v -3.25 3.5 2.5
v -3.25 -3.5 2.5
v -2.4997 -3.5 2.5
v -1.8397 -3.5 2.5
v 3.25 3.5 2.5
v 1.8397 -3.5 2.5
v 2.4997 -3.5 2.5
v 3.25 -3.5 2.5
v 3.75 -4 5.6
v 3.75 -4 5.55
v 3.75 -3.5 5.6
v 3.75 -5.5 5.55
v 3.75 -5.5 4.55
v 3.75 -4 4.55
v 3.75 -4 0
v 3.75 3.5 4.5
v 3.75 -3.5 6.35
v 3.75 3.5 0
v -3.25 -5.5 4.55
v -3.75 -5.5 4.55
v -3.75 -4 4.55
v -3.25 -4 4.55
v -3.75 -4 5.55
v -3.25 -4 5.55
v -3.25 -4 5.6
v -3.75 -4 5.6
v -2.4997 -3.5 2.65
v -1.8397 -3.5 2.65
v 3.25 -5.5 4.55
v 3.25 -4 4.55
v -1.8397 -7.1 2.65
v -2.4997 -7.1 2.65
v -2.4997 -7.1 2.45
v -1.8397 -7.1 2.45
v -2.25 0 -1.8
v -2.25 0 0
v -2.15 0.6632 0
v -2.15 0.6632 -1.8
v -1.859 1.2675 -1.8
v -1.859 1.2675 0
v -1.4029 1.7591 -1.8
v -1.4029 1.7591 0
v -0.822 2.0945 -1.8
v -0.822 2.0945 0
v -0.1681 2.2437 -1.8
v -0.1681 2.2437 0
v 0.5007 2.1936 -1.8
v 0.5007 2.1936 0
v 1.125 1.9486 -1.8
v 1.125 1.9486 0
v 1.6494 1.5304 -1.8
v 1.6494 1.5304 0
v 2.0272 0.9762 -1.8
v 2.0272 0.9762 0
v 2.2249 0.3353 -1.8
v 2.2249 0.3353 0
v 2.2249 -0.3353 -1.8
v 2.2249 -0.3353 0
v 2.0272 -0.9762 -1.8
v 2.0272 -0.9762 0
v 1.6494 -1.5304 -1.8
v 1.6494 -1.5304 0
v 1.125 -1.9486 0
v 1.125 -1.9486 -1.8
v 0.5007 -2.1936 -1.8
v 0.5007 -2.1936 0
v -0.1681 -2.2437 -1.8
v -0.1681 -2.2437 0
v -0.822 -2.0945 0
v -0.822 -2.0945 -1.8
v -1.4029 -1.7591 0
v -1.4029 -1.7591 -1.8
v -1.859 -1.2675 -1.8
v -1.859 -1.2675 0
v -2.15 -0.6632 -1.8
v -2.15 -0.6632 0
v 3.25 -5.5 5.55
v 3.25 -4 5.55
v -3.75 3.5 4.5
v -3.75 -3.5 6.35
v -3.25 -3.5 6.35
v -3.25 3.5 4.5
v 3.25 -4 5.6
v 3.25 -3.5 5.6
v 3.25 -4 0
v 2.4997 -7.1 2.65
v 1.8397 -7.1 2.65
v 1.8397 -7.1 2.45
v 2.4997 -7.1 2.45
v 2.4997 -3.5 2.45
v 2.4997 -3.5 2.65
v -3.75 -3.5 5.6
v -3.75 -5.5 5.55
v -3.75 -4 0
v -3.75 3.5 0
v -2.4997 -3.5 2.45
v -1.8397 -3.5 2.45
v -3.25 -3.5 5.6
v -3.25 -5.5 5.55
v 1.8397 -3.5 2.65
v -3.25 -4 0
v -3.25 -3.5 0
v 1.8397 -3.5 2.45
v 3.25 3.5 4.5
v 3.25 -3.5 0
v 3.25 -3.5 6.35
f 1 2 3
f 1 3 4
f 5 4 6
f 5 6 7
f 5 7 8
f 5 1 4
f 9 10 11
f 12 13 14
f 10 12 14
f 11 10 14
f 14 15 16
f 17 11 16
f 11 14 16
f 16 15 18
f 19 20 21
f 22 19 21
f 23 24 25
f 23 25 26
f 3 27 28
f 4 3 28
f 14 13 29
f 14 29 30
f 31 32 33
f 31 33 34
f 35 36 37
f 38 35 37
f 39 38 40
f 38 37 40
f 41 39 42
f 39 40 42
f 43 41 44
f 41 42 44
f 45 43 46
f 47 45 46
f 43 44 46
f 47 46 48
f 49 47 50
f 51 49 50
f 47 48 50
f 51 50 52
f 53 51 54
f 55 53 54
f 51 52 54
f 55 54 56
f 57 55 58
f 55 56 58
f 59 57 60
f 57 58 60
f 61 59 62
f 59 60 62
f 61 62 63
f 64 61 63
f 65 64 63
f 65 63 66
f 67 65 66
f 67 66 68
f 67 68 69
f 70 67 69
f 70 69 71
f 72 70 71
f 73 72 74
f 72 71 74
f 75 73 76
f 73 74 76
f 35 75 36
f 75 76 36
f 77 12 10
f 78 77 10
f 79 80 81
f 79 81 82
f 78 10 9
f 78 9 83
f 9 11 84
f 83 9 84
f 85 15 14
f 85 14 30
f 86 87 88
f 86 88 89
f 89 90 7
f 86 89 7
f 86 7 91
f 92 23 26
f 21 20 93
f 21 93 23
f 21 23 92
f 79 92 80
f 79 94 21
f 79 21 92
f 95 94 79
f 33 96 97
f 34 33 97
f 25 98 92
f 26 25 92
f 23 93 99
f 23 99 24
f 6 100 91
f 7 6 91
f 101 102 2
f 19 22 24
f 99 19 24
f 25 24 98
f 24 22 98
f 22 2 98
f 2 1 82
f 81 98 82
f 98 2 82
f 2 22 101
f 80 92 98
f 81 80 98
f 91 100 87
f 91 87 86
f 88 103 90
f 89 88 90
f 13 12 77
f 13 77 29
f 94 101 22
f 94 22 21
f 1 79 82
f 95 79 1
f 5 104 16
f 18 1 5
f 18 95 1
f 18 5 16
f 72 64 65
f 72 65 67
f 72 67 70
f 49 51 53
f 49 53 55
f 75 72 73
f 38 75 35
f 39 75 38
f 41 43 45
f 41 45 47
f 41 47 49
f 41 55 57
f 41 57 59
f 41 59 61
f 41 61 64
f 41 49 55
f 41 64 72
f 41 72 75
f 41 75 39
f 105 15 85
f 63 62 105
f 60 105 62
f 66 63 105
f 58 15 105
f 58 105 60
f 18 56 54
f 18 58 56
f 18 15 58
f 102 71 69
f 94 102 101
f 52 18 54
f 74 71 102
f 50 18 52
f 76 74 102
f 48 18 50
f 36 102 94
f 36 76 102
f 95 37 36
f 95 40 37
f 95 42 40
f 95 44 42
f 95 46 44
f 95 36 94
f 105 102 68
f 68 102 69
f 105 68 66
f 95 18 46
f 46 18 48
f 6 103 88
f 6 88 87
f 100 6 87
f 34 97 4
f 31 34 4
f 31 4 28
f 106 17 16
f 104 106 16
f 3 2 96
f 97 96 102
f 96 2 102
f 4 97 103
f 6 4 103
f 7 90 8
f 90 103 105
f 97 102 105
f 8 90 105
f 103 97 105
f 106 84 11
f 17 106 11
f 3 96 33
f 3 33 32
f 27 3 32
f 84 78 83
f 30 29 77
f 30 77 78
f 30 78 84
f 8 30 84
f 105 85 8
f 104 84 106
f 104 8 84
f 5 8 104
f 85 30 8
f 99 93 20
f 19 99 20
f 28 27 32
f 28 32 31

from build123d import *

# Parameters (mm, degrees)
SKETCH_1_W      = 7.5
SKETCH_1_H      = 7
EXTRUDE_1_DEPTH = 2.5
SKETCH_2_R      = 2.25
EXTRUDE_2_DEPTH = 1.8
EXTRUDE_3_DEPTH = 0.5
SKETCH_4_W      = 1
SKETCH_4_H      = 2
EXTRUDE_4_DEPTH = 0.5
SKETCH_5_W      = 0.66
SKETCH_5_H      = 0.2
EXTRUDE_5_DEPTH = 3.6
SKETCH_6_W      = 0.5
SKETCH_6_H      = 0.5
EXTRUDE_6_DEPTH = 5.6


with BuildPart() as part:
    # 草图1 → 凸台-拉伸1 (new body)
    with BuildSketch(Plane.XY):
        Rectangle(SKETCH_1_W, SKETCH_1_H)
    extrude(amount=EXTRUDE_1_DEPTH)

    # 草图2 → 凸台-拉伸2 (add)
    with BuildSketch(Plane(origin=(0, 0, 0), x_dir=(-1, 0, 0), z_dir=(0, 0, -1))):
        Circle(SKETCH_2_R)
    extrude(amount=EXTRUDE_2_DEPTH)

    # 草图3 → 凸台-拉伸3 (add)
    with BuildSketch(Plane(origin=(3.75, 0, 0), x_dir=(0, 0, -1), z_dir=(1, 0, 0))):
        Polygon((0, 3.5), (0, -3.5), (-2.5, -3.5), (-6.35, -3.5), (-4.5, 3.5), align=None)
    extrude_3 = extrude(amount=-EXTRUDE_3_DEPTH)

    # 草图4 → 凸台-拉伸4 (add)
    with BuildSketch(Plane(origin=(3.75, 0, 0), x_dir=(0, 0, -1), z_dir=(1, 0, 0))):
        with Locations((-5.05, -4.5)):
            Rectangle(SKETCH_4_W, SKETCH_4_H)
    extrude_4 = extrude(amount=-EXTRUDE_4_DEPTH)

    # 镜向1: 凸台-拉伸3, 凸台-拉伸4 across plane
    add(extrude_3.mirror(Plane(origin=(0, 0, 0), x_dir=(0, 0, 1), z_dir=(1, 0, 0))))
    add(extrude_4.mirror(Plane(origin=(0, 0, 0), x_dir=(0, 0, 1), z_dir=(1, 0, 0))))

    # 草图5 → 凸台-拉伸5 (add)
    with BuildSketch(Plane.XZ.offset(3.5)):
        with Locations((-2.169711975, 2.55)):
            Rectangle(SKETCH_5_W, SKETCH_5_H)
        with Locations((2.169711975, 2.55)):
            Rectangle(SKETCH_5_W, SKETCH_5_H)
    extrude(amount=EXTRUDE_5_DEPTH)

    # 草图6 → 凸台-拉伸6 (add)
    with BuildSketch(Plane(origin=(0, 0, 0), x_dir=(-1, 0, 0), z_dir=(0, 0, -1))):
        with Locations((-3.5, -3.75)):
            Rectangle(SKETCH_6_W, SKETCH_6_H)
        with Locations((3.5, -3.75)):
            Rectangle(SKETCH_6_W, SKETCH_6_H)
    extrude(amount=-EXTRUDE_6_DEPTH)


solid = part.part
